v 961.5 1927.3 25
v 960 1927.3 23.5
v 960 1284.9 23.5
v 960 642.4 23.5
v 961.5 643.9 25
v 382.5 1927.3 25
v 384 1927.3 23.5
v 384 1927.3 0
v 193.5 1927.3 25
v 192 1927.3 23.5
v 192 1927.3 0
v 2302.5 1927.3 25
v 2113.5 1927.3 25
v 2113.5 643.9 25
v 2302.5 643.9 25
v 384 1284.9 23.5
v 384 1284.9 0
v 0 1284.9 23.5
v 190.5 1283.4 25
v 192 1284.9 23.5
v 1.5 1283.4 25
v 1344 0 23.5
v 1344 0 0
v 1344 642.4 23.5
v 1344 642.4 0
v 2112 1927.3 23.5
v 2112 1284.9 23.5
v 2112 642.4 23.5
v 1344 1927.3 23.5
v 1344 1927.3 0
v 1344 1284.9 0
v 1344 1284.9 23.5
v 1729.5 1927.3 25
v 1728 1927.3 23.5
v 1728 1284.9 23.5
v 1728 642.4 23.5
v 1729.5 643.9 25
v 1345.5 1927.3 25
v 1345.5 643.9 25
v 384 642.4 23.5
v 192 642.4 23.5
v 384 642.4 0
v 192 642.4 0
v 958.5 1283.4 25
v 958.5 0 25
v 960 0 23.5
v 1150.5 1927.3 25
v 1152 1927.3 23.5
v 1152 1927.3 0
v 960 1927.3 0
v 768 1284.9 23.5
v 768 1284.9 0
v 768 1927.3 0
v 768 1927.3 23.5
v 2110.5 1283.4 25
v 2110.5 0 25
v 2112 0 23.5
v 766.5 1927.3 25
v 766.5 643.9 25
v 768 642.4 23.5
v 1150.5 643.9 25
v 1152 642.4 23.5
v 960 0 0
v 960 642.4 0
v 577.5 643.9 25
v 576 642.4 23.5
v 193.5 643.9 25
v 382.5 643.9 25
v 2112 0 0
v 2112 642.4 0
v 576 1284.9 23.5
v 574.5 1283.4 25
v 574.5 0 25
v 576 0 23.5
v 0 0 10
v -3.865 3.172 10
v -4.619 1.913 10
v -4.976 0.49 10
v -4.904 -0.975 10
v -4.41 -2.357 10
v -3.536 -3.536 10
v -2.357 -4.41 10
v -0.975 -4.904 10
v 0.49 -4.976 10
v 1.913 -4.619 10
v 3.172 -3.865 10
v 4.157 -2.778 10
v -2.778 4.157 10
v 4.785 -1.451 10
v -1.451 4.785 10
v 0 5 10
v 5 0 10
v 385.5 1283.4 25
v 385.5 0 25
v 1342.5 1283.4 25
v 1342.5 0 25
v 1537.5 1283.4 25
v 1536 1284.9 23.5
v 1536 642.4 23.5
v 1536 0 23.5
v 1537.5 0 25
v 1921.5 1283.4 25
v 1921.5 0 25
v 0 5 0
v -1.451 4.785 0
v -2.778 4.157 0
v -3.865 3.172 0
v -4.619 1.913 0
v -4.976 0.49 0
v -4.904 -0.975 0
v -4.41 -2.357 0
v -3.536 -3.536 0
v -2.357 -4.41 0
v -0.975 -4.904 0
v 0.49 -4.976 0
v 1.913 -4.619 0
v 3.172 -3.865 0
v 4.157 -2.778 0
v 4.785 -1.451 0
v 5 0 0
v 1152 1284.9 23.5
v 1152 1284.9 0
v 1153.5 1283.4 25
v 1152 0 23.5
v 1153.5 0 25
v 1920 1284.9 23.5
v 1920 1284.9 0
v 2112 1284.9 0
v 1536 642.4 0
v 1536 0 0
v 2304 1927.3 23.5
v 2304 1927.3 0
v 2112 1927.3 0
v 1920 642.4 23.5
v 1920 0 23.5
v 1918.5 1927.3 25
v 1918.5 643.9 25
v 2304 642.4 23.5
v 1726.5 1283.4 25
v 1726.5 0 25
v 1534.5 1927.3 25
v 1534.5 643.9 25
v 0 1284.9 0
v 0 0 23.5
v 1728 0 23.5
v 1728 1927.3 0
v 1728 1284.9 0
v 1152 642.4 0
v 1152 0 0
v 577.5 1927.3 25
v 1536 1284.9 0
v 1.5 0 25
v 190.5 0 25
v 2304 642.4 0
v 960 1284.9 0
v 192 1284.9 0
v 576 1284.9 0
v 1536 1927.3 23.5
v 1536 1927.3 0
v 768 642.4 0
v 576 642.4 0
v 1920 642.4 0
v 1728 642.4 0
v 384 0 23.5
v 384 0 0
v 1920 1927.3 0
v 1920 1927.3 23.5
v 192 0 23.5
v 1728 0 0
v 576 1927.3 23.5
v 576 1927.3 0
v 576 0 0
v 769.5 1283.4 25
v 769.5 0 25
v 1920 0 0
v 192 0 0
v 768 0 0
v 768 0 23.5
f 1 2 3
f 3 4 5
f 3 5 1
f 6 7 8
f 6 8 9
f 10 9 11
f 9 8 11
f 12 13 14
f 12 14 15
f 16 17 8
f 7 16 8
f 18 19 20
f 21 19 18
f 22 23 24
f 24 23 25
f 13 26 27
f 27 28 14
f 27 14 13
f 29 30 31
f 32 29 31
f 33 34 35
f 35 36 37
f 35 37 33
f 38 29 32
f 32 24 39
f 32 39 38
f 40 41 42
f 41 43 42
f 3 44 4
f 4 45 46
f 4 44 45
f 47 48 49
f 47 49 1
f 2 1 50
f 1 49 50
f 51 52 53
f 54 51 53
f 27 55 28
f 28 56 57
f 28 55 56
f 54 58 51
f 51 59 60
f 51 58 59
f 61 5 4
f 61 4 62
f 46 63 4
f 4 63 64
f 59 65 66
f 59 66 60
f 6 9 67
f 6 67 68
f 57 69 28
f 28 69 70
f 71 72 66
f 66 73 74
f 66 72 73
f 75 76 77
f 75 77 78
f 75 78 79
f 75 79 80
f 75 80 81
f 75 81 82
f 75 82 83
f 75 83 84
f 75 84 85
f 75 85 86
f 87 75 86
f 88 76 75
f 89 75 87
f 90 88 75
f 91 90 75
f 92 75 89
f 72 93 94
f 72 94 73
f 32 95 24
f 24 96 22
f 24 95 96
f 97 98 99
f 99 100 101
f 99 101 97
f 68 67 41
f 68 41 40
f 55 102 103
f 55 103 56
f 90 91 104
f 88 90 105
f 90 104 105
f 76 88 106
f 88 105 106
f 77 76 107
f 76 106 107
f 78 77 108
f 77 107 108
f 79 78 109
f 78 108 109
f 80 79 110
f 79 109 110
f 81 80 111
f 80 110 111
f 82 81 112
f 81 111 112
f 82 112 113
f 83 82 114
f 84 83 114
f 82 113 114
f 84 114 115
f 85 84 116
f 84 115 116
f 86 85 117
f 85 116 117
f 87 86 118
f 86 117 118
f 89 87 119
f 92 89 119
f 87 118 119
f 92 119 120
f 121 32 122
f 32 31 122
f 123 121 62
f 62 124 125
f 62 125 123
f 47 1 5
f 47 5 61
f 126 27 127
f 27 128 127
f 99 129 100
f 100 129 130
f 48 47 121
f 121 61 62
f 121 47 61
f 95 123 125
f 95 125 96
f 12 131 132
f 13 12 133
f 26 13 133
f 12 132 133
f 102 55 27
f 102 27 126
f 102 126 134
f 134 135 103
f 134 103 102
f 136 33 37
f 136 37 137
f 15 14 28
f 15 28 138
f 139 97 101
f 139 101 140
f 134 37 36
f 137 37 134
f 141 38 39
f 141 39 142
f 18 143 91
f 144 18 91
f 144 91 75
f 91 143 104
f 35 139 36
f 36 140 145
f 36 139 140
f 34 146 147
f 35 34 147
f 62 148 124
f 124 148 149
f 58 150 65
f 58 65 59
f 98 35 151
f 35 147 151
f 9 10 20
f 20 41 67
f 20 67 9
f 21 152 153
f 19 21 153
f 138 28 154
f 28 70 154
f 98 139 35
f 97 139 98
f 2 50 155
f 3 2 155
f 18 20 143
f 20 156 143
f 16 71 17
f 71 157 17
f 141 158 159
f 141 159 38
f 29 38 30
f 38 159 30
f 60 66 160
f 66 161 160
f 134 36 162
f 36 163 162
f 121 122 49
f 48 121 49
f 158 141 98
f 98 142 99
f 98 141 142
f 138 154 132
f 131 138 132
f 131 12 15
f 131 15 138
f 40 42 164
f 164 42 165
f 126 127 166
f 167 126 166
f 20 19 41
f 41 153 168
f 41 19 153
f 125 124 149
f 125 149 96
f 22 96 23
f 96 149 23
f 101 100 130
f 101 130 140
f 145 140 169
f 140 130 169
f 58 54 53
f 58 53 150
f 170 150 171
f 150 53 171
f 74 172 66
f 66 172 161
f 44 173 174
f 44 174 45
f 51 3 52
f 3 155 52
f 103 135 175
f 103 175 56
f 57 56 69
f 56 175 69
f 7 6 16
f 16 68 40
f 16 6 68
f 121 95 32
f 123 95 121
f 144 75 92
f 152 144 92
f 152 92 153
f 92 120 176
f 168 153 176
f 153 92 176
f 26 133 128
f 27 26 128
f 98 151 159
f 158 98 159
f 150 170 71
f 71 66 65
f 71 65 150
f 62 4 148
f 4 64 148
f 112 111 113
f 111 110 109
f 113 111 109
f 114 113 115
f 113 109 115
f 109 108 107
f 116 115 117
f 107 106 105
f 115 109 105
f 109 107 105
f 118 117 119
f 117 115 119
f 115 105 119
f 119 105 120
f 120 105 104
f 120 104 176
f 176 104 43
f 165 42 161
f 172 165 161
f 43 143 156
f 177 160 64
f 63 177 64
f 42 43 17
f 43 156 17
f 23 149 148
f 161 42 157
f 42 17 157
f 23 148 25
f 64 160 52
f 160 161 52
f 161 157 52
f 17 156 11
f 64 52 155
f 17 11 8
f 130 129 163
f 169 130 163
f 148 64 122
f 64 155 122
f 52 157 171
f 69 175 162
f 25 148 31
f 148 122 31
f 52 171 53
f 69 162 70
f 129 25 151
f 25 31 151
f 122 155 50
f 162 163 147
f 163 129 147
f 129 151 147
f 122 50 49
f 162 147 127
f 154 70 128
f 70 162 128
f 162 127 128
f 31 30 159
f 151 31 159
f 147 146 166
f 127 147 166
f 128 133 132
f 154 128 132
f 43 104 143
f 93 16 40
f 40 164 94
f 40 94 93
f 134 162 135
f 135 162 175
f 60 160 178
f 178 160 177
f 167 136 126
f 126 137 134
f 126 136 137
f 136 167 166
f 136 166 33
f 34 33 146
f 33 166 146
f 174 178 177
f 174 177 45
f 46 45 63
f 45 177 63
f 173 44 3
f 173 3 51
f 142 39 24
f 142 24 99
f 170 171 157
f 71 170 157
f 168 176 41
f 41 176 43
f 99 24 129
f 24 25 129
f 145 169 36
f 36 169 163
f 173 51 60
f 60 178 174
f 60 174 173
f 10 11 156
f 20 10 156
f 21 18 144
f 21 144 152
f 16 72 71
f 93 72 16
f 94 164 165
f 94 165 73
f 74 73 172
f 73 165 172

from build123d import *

# Parameters (mm, degrees)
F0_R     = 5
F1_DEPTH = 10
F3_DEPTH = 25
F5_DEPTH = 1927.301
F6_SIZE  = 1.5


with BuildPart() as f1:
    # F0 (on Top) → F1 (new body)
    with BuildSketch(Plane.XY):
        Circle(F0_R)
    extrude(amount=F1_DEPTH)

    # F2 (on Top) → F3 (join)
    with BuildSketch(Plane.XY):
        Polygon((0, 1284.9), (0, 0), (192, 0), (192, 642.4), (192, 1284.9), align=None)
        Polygon((192, 1284.9), (192, 642.4), (384, 642.4), (384, 1284.9), (384, 1927.3), (192, 1927.3), align=None)
        Polygon((384, 1284.9), (384, 642.4), (384, 0), (576, 0), (576, 642.4), (576, 1284.9), align=None)
        Polygon((576, 1927.3), (576, 1284.9), (576, 642.4), (768, 642.4), (768, 1284.9), (768, 1927.3), align=None)
        Polygon((768, 1284.9), (768, 642.4), (768, 0), (960, 0), (960, 642.4), (960, 1284.9), align=None)
        Polygon((960, 1927.3), (960, 1284.9), (960, 642.4), (1152, 642.4), (1152, 1284.9), (1152, 1927.3), align=None)
        Polygon((1152, 1284.9), (1152, 642.4), (1152, 0), (1344, 0), (1344, 642.4), (1344, 1284.9), align=None)
        Polygon((1344, 1927.3), (1344, 1284.9), (1344, 642.4), (1536, 642.4), (1536, 1284.9), (1536, 1927.3), align=None)
        Polygon((1536, 1284.9), (1536, 642.4), (1536, 0), (1728, 0), (1728, 642.4), (1728, 1284.9), align=None)
        Polygon((1728, 1927.3), (1728, 1284.9), (1728, 642.4), (1920, 642.4), (1920, 1284.9), (1920, 1927.3), align=None)
        Polygon((1920, 1284.9), (1920, 642.4), (1920, 0), (2112, 0), (2112, 642.4), (2112, 1284.9), align=None)
        Polygon((2112, 1927.3), (2112, 1284.9), (2112, 642.4), (2304, 642.4), (2304, 1927.3), align=None)
    extrude(amount=F3_DEPTH)

    # F4 (on face) → F5 (cut, through all)
    with BuildSketch(Plane.XZ):
        Polygon((-1.5, 25), (0, 23.5), (1.5, 25), align=None)
        Polygon((192, 23.5), (193.5, 25), (190.5, 25), align=None)
        Polygon((384, 23.5), (385.5, 25), (382.5, 25), align=None)
        Polygon((576, 23.5), (577.5, 25), (574.5, 25), align=None)
        Polygon((768, 23.5), (769.5, 25), (766.5, 25), align=None)
        Polygon((960, 23.5), (961.5, 25), (958.5, 25), align=None)
        Polygon((1152, 23.5), (1153.5, 25), (1150.5, 25), align=None)
        Polygon((1344, 23.5), (1345.5, 25), (1342.5, 25), align=None)
        Polygon((1536, 23.5), (1537.5, 25), (1534.5, 25), align=None)
        Polygon((1728, 23.5), (1729.5, 25), (1726.5, 25), align=None)
        Polygon((1920, 23.5), (1921.5, 25), (1918.5, 25), align=None)
        Polygon((2112, 23.5), (2113.5, 25), (2110.5, 25), align=None)
        Polygon((2304, 23.5), (2305.5, 25), (2302.5, 25), align=None)
    extrude(amount=-F5_DEPTH, mode=Mode.SUBTRACT)

    # F6
    f6_edges = [f1.edges().sort_by_distance(p)[0] for p in [
        (288, 642.4, 25),
        (672, 642.4, 25),
        (1056, 642.4, 25),
        (1440, 642.4, 25),
        (1824, 642.4, 25),
        (2208, 642.4, 25),
        (96, 1284.9, 25),
        (480, 1284.9, 25),
        (864, 1284.9, 25),
        (1248, 1284.9, 25),
        (1632, 1284.9, 25),
        (2016, 1284.9, 25),
    ]]
    chamfer(f6_edges, length=F6_SIZE)


solid = f1.part
